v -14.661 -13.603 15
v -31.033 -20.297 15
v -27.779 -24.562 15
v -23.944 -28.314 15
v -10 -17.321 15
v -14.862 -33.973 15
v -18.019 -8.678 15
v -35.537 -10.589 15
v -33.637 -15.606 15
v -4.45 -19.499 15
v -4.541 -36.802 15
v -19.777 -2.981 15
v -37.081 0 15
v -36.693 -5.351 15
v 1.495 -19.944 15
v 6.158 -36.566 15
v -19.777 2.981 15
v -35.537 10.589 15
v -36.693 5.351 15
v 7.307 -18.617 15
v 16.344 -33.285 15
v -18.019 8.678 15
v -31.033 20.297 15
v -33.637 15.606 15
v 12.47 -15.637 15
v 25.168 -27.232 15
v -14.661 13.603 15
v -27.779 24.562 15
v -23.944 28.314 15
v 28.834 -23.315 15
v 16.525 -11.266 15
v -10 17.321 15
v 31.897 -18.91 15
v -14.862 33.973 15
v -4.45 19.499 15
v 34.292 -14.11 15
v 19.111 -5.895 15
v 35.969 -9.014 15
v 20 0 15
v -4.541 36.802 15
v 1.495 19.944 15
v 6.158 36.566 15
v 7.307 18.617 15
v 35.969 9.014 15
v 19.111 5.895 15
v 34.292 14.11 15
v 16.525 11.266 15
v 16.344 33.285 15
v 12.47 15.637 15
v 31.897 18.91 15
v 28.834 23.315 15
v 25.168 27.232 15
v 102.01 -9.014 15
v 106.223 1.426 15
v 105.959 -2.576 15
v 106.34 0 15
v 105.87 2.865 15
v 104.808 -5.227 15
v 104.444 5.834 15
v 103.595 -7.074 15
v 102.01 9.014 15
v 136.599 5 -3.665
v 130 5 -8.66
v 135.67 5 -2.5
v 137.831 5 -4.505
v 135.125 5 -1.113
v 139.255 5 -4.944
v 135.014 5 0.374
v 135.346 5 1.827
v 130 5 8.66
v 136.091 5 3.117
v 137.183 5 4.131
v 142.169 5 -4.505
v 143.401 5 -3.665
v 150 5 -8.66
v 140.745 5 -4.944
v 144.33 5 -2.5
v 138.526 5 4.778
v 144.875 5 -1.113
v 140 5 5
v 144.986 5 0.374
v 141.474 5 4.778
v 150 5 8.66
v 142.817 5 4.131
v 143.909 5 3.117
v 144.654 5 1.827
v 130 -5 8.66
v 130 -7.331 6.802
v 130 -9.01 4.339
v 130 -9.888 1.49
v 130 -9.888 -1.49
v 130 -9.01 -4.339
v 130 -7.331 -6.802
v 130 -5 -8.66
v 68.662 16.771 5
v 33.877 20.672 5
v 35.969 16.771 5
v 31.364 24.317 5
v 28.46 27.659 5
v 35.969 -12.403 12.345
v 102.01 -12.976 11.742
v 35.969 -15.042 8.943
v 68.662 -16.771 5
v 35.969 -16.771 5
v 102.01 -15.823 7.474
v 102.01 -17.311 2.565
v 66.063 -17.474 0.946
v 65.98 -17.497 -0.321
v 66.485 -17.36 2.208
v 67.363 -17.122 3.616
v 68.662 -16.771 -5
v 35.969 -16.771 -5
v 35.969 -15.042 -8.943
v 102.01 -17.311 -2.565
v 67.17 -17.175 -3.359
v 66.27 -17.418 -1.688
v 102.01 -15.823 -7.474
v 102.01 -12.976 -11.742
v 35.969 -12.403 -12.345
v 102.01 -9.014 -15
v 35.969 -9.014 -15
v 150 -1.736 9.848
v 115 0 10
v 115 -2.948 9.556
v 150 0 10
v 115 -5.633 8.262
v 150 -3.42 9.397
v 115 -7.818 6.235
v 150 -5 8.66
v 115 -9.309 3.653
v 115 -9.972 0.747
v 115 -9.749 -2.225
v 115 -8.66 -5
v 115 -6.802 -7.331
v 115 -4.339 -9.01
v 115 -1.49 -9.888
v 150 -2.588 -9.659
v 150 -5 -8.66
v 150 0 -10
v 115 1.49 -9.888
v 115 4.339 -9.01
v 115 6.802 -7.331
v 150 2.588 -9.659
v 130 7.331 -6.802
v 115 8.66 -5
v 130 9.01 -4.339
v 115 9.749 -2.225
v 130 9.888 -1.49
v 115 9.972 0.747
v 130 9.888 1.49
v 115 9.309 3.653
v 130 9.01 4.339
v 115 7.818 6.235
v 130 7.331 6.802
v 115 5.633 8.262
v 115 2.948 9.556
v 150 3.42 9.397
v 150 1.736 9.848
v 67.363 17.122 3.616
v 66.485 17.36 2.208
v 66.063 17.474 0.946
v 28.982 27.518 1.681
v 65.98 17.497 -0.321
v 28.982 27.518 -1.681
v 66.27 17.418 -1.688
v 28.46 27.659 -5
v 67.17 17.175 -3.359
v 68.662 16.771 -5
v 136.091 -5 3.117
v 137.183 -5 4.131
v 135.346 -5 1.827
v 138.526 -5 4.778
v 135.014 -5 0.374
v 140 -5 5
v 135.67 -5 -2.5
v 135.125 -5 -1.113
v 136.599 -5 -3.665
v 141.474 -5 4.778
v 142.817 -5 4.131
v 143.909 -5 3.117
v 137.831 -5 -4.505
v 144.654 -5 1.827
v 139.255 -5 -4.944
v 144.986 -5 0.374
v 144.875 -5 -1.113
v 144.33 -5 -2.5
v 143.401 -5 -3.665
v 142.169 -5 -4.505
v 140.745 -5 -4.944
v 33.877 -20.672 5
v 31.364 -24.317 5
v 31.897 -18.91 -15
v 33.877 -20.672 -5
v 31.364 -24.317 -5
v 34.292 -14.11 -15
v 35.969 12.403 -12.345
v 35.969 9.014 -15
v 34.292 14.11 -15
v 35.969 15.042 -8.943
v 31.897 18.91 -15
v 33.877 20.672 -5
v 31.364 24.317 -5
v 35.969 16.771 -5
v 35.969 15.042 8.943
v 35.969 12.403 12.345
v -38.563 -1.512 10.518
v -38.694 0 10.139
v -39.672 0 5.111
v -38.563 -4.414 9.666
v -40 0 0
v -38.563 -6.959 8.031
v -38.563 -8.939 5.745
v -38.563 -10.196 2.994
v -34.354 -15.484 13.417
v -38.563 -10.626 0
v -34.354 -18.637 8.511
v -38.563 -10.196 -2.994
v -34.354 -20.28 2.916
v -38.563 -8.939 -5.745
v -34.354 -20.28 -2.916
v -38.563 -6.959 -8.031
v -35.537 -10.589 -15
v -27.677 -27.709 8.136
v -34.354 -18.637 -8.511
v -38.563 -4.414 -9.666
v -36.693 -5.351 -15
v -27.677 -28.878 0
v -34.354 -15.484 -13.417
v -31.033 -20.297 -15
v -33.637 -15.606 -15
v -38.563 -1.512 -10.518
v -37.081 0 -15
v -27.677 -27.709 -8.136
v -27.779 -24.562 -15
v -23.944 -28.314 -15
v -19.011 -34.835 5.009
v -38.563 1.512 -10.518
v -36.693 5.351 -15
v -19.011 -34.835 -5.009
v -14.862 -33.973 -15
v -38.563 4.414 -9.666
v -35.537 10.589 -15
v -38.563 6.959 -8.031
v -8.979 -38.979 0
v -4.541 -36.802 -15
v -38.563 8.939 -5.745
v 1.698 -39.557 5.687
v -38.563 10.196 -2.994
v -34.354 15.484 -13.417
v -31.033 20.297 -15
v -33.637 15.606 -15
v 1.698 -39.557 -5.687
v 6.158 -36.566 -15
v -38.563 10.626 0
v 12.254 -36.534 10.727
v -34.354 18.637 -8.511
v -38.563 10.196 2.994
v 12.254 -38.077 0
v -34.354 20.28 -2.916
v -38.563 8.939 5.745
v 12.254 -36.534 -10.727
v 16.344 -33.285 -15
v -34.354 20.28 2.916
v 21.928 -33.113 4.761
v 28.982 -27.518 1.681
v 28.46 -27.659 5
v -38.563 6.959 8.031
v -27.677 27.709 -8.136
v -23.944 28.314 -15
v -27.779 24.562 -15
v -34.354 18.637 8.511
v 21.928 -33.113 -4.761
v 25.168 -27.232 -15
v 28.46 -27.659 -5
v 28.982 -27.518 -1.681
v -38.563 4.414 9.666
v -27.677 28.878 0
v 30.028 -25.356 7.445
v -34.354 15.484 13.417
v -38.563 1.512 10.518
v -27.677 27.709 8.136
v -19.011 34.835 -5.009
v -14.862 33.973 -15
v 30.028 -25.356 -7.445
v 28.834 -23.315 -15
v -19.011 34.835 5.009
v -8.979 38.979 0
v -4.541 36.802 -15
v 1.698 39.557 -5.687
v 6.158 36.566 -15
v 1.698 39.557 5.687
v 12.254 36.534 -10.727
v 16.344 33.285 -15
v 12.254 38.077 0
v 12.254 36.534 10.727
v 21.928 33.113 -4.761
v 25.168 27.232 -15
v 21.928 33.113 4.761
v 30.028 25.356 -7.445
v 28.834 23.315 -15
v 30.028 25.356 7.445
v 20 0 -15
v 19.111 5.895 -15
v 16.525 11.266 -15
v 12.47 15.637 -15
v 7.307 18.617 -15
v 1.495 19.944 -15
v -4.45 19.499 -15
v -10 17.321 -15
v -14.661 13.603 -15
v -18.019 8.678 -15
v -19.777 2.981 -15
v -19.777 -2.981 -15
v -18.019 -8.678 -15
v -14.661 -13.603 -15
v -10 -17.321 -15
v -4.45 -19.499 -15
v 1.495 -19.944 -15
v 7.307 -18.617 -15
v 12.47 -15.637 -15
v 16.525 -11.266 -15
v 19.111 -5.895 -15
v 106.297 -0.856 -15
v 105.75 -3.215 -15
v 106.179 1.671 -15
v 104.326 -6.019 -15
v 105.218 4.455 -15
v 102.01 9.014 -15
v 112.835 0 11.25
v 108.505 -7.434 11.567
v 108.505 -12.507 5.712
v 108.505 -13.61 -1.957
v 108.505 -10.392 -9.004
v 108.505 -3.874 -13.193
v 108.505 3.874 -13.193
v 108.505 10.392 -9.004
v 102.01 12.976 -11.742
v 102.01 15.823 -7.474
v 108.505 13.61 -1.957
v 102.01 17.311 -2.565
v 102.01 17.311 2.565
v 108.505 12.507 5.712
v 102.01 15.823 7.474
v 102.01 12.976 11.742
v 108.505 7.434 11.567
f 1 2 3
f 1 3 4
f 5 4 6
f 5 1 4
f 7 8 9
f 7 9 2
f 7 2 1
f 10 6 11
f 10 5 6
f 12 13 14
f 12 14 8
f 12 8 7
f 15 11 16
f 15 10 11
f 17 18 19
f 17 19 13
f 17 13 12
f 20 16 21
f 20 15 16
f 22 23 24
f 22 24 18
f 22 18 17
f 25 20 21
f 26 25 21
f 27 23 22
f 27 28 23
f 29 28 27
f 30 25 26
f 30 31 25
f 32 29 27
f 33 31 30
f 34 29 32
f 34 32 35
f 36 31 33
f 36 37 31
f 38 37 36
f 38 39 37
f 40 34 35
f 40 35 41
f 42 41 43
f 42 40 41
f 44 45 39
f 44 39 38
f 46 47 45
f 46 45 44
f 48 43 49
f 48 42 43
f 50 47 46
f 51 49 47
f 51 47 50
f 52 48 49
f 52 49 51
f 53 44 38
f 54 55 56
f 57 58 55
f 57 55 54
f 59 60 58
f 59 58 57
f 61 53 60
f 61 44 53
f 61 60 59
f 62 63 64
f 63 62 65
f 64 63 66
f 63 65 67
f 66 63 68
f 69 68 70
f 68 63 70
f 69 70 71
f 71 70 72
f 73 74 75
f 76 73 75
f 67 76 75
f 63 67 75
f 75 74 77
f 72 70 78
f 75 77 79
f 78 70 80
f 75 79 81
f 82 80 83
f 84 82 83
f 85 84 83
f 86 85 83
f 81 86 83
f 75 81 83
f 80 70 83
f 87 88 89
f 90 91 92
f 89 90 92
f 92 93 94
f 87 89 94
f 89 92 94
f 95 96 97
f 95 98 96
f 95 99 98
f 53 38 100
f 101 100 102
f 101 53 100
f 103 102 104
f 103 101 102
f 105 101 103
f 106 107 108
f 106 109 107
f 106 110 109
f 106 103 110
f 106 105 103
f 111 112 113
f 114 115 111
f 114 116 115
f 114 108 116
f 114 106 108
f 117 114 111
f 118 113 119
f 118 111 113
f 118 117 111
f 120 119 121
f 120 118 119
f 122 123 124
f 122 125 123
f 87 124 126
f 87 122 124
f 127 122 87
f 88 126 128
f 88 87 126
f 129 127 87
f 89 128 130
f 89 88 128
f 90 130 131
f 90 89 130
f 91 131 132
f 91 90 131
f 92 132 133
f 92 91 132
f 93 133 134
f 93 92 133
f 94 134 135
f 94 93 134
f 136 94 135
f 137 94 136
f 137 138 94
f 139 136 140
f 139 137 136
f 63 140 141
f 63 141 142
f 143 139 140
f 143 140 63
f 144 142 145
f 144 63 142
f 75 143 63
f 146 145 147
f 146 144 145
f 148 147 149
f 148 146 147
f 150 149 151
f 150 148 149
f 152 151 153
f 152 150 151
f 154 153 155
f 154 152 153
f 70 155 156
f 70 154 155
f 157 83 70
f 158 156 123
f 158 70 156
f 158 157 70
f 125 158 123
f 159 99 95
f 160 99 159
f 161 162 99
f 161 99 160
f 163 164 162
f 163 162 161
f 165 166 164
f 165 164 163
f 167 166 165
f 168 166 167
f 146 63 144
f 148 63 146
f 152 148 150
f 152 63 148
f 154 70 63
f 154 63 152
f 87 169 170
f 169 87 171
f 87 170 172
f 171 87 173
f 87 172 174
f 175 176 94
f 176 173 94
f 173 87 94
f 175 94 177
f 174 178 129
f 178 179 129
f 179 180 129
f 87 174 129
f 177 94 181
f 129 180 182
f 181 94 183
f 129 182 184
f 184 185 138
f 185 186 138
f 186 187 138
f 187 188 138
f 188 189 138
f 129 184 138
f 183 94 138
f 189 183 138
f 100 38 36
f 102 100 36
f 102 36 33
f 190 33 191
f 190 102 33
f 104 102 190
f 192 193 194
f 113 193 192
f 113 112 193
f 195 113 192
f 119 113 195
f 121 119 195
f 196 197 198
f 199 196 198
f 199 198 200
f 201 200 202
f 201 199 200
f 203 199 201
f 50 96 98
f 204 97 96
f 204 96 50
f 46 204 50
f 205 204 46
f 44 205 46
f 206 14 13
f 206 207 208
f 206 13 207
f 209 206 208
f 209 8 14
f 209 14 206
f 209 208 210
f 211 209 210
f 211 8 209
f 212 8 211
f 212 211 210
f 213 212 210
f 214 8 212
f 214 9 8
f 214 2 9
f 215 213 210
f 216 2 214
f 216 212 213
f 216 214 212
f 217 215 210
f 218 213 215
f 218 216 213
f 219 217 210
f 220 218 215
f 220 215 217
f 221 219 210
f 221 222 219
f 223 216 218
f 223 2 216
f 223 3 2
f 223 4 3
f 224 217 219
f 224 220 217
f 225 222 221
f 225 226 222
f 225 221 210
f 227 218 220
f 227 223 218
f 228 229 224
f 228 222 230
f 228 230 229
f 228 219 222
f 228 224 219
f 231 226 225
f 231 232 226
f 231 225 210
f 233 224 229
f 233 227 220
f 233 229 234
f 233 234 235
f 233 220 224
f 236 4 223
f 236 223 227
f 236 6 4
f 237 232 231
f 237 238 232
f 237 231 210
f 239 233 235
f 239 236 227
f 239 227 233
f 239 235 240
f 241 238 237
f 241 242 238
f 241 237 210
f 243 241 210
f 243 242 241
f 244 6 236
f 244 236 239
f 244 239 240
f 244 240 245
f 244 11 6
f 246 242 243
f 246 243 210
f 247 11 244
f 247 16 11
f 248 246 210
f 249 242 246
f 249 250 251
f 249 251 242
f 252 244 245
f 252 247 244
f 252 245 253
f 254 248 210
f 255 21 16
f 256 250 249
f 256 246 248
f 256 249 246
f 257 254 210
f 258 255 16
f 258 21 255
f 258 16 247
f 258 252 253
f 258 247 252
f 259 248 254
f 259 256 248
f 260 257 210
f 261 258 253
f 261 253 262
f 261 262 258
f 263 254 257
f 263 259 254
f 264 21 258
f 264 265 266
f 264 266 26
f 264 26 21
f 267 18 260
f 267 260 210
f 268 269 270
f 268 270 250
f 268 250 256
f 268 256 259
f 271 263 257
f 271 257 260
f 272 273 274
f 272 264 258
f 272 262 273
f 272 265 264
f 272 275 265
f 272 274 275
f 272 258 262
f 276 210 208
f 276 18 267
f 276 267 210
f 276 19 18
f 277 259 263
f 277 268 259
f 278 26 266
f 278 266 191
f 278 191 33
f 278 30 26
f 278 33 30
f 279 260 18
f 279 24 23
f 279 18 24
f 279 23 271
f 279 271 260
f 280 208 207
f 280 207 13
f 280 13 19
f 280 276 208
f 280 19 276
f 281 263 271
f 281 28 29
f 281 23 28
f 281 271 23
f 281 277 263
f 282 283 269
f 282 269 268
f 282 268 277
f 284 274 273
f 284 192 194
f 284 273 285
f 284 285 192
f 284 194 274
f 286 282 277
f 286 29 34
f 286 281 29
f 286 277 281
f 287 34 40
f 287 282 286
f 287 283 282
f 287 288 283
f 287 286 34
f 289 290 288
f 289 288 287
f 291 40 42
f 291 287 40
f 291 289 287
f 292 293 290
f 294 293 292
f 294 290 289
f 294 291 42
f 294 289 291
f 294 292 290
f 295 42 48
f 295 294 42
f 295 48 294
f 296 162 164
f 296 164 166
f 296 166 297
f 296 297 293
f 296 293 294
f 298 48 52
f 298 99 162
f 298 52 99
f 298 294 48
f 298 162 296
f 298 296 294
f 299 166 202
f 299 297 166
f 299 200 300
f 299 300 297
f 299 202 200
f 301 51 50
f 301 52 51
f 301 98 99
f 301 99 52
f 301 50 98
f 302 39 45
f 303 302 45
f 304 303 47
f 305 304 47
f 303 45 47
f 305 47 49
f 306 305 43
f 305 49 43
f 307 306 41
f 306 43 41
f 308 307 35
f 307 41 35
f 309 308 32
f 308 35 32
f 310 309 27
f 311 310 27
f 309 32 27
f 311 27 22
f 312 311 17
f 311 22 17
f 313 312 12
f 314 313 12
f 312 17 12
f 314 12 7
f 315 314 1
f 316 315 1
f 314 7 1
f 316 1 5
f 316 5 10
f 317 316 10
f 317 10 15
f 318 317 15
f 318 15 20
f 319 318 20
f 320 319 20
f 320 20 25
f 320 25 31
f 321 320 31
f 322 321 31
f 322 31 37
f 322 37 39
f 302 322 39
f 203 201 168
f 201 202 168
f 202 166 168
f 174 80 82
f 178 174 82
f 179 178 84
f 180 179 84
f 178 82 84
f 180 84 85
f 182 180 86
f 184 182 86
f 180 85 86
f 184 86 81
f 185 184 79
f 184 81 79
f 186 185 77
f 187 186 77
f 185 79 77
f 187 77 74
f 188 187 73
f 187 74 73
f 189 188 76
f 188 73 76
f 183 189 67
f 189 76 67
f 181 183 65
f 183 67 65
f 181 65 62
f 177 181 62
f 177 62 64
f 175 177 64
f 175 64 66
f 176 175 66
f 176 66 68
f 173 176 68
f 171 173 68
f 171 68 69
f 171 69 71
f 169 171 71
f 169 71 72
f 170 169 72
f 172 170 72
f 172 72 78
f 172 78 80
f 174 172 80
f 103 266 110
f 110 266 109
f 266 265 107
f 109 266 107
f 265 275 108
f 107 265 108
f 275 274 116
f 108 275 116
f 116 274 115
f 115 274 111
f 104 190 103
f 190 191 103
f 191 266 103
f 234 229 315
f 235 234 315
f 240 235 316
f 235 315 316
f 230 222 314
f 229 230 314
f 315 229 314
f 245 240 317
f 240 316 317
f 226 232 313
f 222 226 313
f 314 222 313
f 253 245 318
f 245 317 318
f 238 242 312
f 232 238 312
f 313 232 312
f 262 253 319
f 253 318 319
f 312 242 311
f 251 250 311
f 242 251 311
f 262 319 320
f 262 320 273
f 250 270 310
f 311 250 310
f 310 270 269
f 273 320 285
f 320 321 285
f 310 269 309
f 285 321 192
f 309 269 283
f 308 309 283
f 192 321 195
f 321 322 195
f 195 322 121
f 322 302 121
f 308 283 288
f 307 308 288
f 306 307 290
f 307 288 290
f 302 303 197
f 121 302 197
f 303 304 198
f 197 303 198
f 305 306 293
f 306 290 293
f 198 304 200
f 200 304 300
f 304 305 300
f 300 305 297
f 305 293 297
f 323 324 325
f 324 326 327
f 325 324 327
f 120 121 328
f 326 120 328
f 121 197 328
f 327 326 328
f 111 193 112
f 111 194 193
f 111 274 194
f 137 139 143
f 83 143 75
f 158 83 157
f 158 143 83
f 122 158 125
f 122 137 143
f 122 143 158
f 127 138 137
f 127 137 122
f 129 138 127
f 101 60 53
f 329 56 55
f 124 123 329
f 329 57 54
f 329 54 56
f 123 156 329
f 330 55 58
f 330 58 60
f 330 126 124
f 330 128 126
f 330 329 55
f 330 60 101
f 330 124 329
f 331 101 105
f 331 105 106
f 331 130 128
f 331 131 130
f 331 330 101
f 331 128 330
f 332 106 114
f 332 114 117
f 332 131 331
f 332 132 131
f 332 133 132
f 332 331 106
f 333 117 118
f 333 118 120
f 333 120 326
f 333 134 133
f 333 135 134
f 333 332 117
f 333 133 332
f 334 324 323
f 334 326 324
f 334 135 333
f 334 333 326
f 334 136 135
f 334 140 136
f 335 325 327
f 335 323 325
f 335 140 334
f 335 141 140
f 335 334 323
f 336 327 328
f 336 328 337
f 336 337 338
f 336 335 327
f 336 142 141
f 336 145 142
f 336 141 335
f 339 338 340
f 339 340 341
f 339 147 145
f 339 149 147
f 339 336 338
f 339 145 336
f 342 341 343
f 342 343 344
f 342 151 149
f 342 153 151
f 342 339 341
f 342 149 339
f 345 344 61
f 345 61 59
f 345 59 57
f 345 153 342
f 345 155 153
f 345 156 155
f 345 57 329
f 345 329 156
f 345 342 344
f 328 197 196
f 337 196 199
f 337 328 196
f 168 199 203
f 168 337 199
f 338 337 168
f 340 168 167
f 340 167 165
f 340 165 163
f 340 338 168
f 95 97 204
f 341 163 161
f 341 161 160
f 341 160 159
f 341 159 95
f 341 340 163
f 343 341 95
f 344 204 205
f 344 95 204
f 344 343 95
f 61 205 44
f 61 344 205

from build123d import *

# Parameters (mm, degrees)
CUT_EXTRUDE_START                    = 15
SKETCH_4_W                           = 227.596726831
SKETCH_4_H                           = 99.432892292
CUT_EXTRUDE_1_DEPTH                  = 50
CUT_EXTRUDE_2_REACH                  = 160.114
SKETCH_5_R                           = 20
CUT_EXTRUDE_4_REACH                  = 157.965
CUT_EXTRUDE_4_END_RADIUS             = 10
SKETCH_6_W                           = 20
SKETCH_6_H                           = 5
CUT_EXTRUDE_4_DIRECTION_2_REACH      = 157.965
CUT_EXTRUDE_4_DIRECTION_2_END_RADIUS = 10
CUT_EXTRUDE_5_REACH                  = 159.321
SKETCH_8_R                           = 5
RIB_1_REACH                          = 157.965
SKETCH_9_WALL_W                      = 352.18110561
SKETCH_9_WALL_H                      = 10


with BuildPart() as part:
    # 草图2 → 旋转1 (revolve)
    with BuildSketch(Plane.XY, mode=Mode.PRIVATE) as revolve_1_sk:
        with BuildLine():
            Line((35.968736425, 17.5), (102.009618943, 17.5))
            Line((102.009618943, 17.5), (115, 10))
            Line((115, 10), (150, 10))
            Line((150, 10), (150, 0))
            Line((150, 0), (40, 0))
            Line((40, 0), (-40, 0))
            ThreePointArc((-40, 0), (-8.979157617, 38.979157617), (35.968736425, 17.5))
        make_face()
    revolve(revolve_1_sk.sketch.rotate(Axis((0, 0, 0), (1, 0, 0)), 90), axis=Axis((0, 0, 0), (1, 0, 0)))

    # 草图4 → 切除-拉伸1 (cut)
    with BuildSketch(Plane.XY.offset(CUT_EXTRUDE_START)):
        with Locations((54.933799673, 2.64801311)):
            Rectangle(SKETCH_4_W, SKETCH_4_H)
    cut_extrude_1 = extrude(amount=CUT_EXTRUDE_1_DEPTH, mode=Mode.SUBTRACT)

    # 镜向1: 切除-拉伸1 across plane
    add(cut_extrude_1.mirror(Plane.XY), mode=Mode.SUBTRACT)

    # 草图5 → 切除-拉伸2 (cut, up to next)
    with BuildSketch(Plane.XY.offset(15), mode=Mode.PRIVATE) as cut_extrude_2_sk1:
        Circle(SKETCH_5_R)
    cut_extrude_2_tool1 = extrude(cut_extrude_2_sk1.sketch, amount=-CUT_EXTRUDE_2_REACH, mode=Mode.PRIVATE) & part.part
    add(cut_extrude_2_tool1.solids().sort_by_distance((0, 0, 15))[0], mode=Mode.SUBTRACT)

    # 切除-拉伸4: up to this cylinder (the profile starts inside it)
    cut_extrude_4_end = Plane(origin=(140, 0, 0), z_dir=(-1, 0, 0)) * Cylinder(CUT_EXTRUDE_4_END_RADIUS, 336.93, mode=Mode.PRIVATE)
    # 草图6 → 切除-拉伸4 (cut, up to the surface)
    with BuildSketch(Plane.XY, mode=Mode.PRIVATE) as cut_extrude_4_sk1:
        with Locations((140, 7.5)):
            Rectangle(SKETCH_6_W, SKETCH_6_H)
    cut_extrude_4_tool1 = extrude(cut_extrude_4_sk1.sketch, amount=-CUT_EXTRUDE_4_REACH, mode=Mode.PRIVATE) & cut_extrude_4_end
    add(cut_extrude_4_tool1.solids().sort_by_distance((140, 7.5, 0))[0], mode=Mode.SUBTRACT)
    # 草图6 → 切除-拉伸4 (cut, up to the surface)
    with BuildSketch(Plane.XY, mode=Mode.PRIVATE) as cut_extrude_4_sk2:
        with Locations((140, -7.5)):
            Rectangle(SKETCH_6_W, SKETCH_6_H)
    cut_extrude_4_tool2 = extrude(cut_extrude_4_sk2.sketch, amount=-CUT_EXTRUDE_4_REACH, mode=Mode.PRIVATE) & cut_extrude_4_end
    add(cut_extrude_4_tool2.solids().sort_by_distance((140, -7.5, 0))[0], mode=Mode.SUBTRACT)

    # 切除-拉伸4 direction 2: up to this cylinder (the profile starts inside it)
    cut_extrude_4_direction_2_end = Plane(origin=(140, 0, 0), z_dir=(-1, 0, 0)) * Cylinder(CUT_EXTRUDE_4_DIRECTION_2_END_RADIUS, 336.93, mode=Mode.PRIVATE)
    # 草图6 → 切除-拉伸4 direction 2 (cut, up to the surface)
    with BuildSketch(Plane.XY, mode=Mode.PRIVATE) as cut_extrude_4_direction_2_sk1:
        with Locations((140, 7.5)):
            Rectangle(SKETCH_6_W, SKETCH_6_H)
    cut_extrude_4_direction_2_tool1 = extrude(cut_extrude_4_direction_2_sk1.sketch, amount=CUT_EXTRUDE_4_DIRECTION_2_REACH, mode=Mode.PRIVATE) & cut_extrude_4_direction_2_end
    add(cut_extrude_4_direction_2_tool1.solids().sort_by_distance((140, 7.5, 0))[0], mode=Mode.SUBTRACT)
    # 草图6 → 切除-拉伸4 direction 2 (cut, up to the surface)
    with BuildSketch(Plane.XY, mode=Mode.PRIVATE) as cut_extrude_4_direction_2_sk2:
        with Locations((140, -7.5)):
            Rectangle(SKETCH_6_W, SKETCH_6_H)
    cut_extrude_4_direction_2_tool2 = extrude(cut_extrude_4_direction_2_sk2.sketch, amount=CUT_EXTRUDE_4_DIRECTION_2_REACH, mode=Mode.PRIVATE) & cut_extrude_4_direction_2_end
    add(cut_extrude_4_direction_2_tool2.solids().sort_by_distance((140, -7.5, 0))[0], mode=Mode.SUBTRACT)

    # 草图8 → 切除-拉伸5 (cut, up to next)
    with BuildSketch(Plane(origin=(0, 5, 0), x_dir=(1, 0, 0), z_dir=(0, 1, 0)), mode=Mode.PRIVATE) as cut_extrude_5_sk1:
        with Locations(Location((140, 0, 0), (0, 0, 270))):
            Circle(SKETCH_8_R)
    cut_extrude_5_tool1 = extrude(cut_extrude_5_sk1.sketch, amount=-CUT_EXTRUDE_5_REACH, mode=Mode.PRIVATE) & part.part
    add(cut_extrude_5_tool1.solids().sort_by_distance((140, 5, 0))[0], mode=Mode.SUBTRACT)

    # 草图9 wall → 筋1 (add, up to next)
    with BuildSketch(Plane(origin=(47.508055761, 22.5, 0), x_dir=(0.965223306875, -0.261426792555, 0), z_dir=(0.261426792555, 0.965223306875, 0)), mode=Mode.PRIVATE) as rib_1_sk1:
        Rectangle(SKETCH_9_WALL_W, SKETCH_9_WALL_H)
    rib_1_tool1 = extrude(rib_1_sk1.sketch, amount=-RIB_1_REACH, mode=Mode.PRIVATE) - part.part
    rib_1 = rib_1_tool1.solids().sort_by_distance((47.508055761, 22.5, 0))[0]
    add(rib_1)

    # 镜向2: 筋1 across plane
    add(rib_1.mirror(Plane(origin=(0, 0, 0), x_dir=(0, 0, 1), z_dir=(0, -1, 0))))


solid = part.part
